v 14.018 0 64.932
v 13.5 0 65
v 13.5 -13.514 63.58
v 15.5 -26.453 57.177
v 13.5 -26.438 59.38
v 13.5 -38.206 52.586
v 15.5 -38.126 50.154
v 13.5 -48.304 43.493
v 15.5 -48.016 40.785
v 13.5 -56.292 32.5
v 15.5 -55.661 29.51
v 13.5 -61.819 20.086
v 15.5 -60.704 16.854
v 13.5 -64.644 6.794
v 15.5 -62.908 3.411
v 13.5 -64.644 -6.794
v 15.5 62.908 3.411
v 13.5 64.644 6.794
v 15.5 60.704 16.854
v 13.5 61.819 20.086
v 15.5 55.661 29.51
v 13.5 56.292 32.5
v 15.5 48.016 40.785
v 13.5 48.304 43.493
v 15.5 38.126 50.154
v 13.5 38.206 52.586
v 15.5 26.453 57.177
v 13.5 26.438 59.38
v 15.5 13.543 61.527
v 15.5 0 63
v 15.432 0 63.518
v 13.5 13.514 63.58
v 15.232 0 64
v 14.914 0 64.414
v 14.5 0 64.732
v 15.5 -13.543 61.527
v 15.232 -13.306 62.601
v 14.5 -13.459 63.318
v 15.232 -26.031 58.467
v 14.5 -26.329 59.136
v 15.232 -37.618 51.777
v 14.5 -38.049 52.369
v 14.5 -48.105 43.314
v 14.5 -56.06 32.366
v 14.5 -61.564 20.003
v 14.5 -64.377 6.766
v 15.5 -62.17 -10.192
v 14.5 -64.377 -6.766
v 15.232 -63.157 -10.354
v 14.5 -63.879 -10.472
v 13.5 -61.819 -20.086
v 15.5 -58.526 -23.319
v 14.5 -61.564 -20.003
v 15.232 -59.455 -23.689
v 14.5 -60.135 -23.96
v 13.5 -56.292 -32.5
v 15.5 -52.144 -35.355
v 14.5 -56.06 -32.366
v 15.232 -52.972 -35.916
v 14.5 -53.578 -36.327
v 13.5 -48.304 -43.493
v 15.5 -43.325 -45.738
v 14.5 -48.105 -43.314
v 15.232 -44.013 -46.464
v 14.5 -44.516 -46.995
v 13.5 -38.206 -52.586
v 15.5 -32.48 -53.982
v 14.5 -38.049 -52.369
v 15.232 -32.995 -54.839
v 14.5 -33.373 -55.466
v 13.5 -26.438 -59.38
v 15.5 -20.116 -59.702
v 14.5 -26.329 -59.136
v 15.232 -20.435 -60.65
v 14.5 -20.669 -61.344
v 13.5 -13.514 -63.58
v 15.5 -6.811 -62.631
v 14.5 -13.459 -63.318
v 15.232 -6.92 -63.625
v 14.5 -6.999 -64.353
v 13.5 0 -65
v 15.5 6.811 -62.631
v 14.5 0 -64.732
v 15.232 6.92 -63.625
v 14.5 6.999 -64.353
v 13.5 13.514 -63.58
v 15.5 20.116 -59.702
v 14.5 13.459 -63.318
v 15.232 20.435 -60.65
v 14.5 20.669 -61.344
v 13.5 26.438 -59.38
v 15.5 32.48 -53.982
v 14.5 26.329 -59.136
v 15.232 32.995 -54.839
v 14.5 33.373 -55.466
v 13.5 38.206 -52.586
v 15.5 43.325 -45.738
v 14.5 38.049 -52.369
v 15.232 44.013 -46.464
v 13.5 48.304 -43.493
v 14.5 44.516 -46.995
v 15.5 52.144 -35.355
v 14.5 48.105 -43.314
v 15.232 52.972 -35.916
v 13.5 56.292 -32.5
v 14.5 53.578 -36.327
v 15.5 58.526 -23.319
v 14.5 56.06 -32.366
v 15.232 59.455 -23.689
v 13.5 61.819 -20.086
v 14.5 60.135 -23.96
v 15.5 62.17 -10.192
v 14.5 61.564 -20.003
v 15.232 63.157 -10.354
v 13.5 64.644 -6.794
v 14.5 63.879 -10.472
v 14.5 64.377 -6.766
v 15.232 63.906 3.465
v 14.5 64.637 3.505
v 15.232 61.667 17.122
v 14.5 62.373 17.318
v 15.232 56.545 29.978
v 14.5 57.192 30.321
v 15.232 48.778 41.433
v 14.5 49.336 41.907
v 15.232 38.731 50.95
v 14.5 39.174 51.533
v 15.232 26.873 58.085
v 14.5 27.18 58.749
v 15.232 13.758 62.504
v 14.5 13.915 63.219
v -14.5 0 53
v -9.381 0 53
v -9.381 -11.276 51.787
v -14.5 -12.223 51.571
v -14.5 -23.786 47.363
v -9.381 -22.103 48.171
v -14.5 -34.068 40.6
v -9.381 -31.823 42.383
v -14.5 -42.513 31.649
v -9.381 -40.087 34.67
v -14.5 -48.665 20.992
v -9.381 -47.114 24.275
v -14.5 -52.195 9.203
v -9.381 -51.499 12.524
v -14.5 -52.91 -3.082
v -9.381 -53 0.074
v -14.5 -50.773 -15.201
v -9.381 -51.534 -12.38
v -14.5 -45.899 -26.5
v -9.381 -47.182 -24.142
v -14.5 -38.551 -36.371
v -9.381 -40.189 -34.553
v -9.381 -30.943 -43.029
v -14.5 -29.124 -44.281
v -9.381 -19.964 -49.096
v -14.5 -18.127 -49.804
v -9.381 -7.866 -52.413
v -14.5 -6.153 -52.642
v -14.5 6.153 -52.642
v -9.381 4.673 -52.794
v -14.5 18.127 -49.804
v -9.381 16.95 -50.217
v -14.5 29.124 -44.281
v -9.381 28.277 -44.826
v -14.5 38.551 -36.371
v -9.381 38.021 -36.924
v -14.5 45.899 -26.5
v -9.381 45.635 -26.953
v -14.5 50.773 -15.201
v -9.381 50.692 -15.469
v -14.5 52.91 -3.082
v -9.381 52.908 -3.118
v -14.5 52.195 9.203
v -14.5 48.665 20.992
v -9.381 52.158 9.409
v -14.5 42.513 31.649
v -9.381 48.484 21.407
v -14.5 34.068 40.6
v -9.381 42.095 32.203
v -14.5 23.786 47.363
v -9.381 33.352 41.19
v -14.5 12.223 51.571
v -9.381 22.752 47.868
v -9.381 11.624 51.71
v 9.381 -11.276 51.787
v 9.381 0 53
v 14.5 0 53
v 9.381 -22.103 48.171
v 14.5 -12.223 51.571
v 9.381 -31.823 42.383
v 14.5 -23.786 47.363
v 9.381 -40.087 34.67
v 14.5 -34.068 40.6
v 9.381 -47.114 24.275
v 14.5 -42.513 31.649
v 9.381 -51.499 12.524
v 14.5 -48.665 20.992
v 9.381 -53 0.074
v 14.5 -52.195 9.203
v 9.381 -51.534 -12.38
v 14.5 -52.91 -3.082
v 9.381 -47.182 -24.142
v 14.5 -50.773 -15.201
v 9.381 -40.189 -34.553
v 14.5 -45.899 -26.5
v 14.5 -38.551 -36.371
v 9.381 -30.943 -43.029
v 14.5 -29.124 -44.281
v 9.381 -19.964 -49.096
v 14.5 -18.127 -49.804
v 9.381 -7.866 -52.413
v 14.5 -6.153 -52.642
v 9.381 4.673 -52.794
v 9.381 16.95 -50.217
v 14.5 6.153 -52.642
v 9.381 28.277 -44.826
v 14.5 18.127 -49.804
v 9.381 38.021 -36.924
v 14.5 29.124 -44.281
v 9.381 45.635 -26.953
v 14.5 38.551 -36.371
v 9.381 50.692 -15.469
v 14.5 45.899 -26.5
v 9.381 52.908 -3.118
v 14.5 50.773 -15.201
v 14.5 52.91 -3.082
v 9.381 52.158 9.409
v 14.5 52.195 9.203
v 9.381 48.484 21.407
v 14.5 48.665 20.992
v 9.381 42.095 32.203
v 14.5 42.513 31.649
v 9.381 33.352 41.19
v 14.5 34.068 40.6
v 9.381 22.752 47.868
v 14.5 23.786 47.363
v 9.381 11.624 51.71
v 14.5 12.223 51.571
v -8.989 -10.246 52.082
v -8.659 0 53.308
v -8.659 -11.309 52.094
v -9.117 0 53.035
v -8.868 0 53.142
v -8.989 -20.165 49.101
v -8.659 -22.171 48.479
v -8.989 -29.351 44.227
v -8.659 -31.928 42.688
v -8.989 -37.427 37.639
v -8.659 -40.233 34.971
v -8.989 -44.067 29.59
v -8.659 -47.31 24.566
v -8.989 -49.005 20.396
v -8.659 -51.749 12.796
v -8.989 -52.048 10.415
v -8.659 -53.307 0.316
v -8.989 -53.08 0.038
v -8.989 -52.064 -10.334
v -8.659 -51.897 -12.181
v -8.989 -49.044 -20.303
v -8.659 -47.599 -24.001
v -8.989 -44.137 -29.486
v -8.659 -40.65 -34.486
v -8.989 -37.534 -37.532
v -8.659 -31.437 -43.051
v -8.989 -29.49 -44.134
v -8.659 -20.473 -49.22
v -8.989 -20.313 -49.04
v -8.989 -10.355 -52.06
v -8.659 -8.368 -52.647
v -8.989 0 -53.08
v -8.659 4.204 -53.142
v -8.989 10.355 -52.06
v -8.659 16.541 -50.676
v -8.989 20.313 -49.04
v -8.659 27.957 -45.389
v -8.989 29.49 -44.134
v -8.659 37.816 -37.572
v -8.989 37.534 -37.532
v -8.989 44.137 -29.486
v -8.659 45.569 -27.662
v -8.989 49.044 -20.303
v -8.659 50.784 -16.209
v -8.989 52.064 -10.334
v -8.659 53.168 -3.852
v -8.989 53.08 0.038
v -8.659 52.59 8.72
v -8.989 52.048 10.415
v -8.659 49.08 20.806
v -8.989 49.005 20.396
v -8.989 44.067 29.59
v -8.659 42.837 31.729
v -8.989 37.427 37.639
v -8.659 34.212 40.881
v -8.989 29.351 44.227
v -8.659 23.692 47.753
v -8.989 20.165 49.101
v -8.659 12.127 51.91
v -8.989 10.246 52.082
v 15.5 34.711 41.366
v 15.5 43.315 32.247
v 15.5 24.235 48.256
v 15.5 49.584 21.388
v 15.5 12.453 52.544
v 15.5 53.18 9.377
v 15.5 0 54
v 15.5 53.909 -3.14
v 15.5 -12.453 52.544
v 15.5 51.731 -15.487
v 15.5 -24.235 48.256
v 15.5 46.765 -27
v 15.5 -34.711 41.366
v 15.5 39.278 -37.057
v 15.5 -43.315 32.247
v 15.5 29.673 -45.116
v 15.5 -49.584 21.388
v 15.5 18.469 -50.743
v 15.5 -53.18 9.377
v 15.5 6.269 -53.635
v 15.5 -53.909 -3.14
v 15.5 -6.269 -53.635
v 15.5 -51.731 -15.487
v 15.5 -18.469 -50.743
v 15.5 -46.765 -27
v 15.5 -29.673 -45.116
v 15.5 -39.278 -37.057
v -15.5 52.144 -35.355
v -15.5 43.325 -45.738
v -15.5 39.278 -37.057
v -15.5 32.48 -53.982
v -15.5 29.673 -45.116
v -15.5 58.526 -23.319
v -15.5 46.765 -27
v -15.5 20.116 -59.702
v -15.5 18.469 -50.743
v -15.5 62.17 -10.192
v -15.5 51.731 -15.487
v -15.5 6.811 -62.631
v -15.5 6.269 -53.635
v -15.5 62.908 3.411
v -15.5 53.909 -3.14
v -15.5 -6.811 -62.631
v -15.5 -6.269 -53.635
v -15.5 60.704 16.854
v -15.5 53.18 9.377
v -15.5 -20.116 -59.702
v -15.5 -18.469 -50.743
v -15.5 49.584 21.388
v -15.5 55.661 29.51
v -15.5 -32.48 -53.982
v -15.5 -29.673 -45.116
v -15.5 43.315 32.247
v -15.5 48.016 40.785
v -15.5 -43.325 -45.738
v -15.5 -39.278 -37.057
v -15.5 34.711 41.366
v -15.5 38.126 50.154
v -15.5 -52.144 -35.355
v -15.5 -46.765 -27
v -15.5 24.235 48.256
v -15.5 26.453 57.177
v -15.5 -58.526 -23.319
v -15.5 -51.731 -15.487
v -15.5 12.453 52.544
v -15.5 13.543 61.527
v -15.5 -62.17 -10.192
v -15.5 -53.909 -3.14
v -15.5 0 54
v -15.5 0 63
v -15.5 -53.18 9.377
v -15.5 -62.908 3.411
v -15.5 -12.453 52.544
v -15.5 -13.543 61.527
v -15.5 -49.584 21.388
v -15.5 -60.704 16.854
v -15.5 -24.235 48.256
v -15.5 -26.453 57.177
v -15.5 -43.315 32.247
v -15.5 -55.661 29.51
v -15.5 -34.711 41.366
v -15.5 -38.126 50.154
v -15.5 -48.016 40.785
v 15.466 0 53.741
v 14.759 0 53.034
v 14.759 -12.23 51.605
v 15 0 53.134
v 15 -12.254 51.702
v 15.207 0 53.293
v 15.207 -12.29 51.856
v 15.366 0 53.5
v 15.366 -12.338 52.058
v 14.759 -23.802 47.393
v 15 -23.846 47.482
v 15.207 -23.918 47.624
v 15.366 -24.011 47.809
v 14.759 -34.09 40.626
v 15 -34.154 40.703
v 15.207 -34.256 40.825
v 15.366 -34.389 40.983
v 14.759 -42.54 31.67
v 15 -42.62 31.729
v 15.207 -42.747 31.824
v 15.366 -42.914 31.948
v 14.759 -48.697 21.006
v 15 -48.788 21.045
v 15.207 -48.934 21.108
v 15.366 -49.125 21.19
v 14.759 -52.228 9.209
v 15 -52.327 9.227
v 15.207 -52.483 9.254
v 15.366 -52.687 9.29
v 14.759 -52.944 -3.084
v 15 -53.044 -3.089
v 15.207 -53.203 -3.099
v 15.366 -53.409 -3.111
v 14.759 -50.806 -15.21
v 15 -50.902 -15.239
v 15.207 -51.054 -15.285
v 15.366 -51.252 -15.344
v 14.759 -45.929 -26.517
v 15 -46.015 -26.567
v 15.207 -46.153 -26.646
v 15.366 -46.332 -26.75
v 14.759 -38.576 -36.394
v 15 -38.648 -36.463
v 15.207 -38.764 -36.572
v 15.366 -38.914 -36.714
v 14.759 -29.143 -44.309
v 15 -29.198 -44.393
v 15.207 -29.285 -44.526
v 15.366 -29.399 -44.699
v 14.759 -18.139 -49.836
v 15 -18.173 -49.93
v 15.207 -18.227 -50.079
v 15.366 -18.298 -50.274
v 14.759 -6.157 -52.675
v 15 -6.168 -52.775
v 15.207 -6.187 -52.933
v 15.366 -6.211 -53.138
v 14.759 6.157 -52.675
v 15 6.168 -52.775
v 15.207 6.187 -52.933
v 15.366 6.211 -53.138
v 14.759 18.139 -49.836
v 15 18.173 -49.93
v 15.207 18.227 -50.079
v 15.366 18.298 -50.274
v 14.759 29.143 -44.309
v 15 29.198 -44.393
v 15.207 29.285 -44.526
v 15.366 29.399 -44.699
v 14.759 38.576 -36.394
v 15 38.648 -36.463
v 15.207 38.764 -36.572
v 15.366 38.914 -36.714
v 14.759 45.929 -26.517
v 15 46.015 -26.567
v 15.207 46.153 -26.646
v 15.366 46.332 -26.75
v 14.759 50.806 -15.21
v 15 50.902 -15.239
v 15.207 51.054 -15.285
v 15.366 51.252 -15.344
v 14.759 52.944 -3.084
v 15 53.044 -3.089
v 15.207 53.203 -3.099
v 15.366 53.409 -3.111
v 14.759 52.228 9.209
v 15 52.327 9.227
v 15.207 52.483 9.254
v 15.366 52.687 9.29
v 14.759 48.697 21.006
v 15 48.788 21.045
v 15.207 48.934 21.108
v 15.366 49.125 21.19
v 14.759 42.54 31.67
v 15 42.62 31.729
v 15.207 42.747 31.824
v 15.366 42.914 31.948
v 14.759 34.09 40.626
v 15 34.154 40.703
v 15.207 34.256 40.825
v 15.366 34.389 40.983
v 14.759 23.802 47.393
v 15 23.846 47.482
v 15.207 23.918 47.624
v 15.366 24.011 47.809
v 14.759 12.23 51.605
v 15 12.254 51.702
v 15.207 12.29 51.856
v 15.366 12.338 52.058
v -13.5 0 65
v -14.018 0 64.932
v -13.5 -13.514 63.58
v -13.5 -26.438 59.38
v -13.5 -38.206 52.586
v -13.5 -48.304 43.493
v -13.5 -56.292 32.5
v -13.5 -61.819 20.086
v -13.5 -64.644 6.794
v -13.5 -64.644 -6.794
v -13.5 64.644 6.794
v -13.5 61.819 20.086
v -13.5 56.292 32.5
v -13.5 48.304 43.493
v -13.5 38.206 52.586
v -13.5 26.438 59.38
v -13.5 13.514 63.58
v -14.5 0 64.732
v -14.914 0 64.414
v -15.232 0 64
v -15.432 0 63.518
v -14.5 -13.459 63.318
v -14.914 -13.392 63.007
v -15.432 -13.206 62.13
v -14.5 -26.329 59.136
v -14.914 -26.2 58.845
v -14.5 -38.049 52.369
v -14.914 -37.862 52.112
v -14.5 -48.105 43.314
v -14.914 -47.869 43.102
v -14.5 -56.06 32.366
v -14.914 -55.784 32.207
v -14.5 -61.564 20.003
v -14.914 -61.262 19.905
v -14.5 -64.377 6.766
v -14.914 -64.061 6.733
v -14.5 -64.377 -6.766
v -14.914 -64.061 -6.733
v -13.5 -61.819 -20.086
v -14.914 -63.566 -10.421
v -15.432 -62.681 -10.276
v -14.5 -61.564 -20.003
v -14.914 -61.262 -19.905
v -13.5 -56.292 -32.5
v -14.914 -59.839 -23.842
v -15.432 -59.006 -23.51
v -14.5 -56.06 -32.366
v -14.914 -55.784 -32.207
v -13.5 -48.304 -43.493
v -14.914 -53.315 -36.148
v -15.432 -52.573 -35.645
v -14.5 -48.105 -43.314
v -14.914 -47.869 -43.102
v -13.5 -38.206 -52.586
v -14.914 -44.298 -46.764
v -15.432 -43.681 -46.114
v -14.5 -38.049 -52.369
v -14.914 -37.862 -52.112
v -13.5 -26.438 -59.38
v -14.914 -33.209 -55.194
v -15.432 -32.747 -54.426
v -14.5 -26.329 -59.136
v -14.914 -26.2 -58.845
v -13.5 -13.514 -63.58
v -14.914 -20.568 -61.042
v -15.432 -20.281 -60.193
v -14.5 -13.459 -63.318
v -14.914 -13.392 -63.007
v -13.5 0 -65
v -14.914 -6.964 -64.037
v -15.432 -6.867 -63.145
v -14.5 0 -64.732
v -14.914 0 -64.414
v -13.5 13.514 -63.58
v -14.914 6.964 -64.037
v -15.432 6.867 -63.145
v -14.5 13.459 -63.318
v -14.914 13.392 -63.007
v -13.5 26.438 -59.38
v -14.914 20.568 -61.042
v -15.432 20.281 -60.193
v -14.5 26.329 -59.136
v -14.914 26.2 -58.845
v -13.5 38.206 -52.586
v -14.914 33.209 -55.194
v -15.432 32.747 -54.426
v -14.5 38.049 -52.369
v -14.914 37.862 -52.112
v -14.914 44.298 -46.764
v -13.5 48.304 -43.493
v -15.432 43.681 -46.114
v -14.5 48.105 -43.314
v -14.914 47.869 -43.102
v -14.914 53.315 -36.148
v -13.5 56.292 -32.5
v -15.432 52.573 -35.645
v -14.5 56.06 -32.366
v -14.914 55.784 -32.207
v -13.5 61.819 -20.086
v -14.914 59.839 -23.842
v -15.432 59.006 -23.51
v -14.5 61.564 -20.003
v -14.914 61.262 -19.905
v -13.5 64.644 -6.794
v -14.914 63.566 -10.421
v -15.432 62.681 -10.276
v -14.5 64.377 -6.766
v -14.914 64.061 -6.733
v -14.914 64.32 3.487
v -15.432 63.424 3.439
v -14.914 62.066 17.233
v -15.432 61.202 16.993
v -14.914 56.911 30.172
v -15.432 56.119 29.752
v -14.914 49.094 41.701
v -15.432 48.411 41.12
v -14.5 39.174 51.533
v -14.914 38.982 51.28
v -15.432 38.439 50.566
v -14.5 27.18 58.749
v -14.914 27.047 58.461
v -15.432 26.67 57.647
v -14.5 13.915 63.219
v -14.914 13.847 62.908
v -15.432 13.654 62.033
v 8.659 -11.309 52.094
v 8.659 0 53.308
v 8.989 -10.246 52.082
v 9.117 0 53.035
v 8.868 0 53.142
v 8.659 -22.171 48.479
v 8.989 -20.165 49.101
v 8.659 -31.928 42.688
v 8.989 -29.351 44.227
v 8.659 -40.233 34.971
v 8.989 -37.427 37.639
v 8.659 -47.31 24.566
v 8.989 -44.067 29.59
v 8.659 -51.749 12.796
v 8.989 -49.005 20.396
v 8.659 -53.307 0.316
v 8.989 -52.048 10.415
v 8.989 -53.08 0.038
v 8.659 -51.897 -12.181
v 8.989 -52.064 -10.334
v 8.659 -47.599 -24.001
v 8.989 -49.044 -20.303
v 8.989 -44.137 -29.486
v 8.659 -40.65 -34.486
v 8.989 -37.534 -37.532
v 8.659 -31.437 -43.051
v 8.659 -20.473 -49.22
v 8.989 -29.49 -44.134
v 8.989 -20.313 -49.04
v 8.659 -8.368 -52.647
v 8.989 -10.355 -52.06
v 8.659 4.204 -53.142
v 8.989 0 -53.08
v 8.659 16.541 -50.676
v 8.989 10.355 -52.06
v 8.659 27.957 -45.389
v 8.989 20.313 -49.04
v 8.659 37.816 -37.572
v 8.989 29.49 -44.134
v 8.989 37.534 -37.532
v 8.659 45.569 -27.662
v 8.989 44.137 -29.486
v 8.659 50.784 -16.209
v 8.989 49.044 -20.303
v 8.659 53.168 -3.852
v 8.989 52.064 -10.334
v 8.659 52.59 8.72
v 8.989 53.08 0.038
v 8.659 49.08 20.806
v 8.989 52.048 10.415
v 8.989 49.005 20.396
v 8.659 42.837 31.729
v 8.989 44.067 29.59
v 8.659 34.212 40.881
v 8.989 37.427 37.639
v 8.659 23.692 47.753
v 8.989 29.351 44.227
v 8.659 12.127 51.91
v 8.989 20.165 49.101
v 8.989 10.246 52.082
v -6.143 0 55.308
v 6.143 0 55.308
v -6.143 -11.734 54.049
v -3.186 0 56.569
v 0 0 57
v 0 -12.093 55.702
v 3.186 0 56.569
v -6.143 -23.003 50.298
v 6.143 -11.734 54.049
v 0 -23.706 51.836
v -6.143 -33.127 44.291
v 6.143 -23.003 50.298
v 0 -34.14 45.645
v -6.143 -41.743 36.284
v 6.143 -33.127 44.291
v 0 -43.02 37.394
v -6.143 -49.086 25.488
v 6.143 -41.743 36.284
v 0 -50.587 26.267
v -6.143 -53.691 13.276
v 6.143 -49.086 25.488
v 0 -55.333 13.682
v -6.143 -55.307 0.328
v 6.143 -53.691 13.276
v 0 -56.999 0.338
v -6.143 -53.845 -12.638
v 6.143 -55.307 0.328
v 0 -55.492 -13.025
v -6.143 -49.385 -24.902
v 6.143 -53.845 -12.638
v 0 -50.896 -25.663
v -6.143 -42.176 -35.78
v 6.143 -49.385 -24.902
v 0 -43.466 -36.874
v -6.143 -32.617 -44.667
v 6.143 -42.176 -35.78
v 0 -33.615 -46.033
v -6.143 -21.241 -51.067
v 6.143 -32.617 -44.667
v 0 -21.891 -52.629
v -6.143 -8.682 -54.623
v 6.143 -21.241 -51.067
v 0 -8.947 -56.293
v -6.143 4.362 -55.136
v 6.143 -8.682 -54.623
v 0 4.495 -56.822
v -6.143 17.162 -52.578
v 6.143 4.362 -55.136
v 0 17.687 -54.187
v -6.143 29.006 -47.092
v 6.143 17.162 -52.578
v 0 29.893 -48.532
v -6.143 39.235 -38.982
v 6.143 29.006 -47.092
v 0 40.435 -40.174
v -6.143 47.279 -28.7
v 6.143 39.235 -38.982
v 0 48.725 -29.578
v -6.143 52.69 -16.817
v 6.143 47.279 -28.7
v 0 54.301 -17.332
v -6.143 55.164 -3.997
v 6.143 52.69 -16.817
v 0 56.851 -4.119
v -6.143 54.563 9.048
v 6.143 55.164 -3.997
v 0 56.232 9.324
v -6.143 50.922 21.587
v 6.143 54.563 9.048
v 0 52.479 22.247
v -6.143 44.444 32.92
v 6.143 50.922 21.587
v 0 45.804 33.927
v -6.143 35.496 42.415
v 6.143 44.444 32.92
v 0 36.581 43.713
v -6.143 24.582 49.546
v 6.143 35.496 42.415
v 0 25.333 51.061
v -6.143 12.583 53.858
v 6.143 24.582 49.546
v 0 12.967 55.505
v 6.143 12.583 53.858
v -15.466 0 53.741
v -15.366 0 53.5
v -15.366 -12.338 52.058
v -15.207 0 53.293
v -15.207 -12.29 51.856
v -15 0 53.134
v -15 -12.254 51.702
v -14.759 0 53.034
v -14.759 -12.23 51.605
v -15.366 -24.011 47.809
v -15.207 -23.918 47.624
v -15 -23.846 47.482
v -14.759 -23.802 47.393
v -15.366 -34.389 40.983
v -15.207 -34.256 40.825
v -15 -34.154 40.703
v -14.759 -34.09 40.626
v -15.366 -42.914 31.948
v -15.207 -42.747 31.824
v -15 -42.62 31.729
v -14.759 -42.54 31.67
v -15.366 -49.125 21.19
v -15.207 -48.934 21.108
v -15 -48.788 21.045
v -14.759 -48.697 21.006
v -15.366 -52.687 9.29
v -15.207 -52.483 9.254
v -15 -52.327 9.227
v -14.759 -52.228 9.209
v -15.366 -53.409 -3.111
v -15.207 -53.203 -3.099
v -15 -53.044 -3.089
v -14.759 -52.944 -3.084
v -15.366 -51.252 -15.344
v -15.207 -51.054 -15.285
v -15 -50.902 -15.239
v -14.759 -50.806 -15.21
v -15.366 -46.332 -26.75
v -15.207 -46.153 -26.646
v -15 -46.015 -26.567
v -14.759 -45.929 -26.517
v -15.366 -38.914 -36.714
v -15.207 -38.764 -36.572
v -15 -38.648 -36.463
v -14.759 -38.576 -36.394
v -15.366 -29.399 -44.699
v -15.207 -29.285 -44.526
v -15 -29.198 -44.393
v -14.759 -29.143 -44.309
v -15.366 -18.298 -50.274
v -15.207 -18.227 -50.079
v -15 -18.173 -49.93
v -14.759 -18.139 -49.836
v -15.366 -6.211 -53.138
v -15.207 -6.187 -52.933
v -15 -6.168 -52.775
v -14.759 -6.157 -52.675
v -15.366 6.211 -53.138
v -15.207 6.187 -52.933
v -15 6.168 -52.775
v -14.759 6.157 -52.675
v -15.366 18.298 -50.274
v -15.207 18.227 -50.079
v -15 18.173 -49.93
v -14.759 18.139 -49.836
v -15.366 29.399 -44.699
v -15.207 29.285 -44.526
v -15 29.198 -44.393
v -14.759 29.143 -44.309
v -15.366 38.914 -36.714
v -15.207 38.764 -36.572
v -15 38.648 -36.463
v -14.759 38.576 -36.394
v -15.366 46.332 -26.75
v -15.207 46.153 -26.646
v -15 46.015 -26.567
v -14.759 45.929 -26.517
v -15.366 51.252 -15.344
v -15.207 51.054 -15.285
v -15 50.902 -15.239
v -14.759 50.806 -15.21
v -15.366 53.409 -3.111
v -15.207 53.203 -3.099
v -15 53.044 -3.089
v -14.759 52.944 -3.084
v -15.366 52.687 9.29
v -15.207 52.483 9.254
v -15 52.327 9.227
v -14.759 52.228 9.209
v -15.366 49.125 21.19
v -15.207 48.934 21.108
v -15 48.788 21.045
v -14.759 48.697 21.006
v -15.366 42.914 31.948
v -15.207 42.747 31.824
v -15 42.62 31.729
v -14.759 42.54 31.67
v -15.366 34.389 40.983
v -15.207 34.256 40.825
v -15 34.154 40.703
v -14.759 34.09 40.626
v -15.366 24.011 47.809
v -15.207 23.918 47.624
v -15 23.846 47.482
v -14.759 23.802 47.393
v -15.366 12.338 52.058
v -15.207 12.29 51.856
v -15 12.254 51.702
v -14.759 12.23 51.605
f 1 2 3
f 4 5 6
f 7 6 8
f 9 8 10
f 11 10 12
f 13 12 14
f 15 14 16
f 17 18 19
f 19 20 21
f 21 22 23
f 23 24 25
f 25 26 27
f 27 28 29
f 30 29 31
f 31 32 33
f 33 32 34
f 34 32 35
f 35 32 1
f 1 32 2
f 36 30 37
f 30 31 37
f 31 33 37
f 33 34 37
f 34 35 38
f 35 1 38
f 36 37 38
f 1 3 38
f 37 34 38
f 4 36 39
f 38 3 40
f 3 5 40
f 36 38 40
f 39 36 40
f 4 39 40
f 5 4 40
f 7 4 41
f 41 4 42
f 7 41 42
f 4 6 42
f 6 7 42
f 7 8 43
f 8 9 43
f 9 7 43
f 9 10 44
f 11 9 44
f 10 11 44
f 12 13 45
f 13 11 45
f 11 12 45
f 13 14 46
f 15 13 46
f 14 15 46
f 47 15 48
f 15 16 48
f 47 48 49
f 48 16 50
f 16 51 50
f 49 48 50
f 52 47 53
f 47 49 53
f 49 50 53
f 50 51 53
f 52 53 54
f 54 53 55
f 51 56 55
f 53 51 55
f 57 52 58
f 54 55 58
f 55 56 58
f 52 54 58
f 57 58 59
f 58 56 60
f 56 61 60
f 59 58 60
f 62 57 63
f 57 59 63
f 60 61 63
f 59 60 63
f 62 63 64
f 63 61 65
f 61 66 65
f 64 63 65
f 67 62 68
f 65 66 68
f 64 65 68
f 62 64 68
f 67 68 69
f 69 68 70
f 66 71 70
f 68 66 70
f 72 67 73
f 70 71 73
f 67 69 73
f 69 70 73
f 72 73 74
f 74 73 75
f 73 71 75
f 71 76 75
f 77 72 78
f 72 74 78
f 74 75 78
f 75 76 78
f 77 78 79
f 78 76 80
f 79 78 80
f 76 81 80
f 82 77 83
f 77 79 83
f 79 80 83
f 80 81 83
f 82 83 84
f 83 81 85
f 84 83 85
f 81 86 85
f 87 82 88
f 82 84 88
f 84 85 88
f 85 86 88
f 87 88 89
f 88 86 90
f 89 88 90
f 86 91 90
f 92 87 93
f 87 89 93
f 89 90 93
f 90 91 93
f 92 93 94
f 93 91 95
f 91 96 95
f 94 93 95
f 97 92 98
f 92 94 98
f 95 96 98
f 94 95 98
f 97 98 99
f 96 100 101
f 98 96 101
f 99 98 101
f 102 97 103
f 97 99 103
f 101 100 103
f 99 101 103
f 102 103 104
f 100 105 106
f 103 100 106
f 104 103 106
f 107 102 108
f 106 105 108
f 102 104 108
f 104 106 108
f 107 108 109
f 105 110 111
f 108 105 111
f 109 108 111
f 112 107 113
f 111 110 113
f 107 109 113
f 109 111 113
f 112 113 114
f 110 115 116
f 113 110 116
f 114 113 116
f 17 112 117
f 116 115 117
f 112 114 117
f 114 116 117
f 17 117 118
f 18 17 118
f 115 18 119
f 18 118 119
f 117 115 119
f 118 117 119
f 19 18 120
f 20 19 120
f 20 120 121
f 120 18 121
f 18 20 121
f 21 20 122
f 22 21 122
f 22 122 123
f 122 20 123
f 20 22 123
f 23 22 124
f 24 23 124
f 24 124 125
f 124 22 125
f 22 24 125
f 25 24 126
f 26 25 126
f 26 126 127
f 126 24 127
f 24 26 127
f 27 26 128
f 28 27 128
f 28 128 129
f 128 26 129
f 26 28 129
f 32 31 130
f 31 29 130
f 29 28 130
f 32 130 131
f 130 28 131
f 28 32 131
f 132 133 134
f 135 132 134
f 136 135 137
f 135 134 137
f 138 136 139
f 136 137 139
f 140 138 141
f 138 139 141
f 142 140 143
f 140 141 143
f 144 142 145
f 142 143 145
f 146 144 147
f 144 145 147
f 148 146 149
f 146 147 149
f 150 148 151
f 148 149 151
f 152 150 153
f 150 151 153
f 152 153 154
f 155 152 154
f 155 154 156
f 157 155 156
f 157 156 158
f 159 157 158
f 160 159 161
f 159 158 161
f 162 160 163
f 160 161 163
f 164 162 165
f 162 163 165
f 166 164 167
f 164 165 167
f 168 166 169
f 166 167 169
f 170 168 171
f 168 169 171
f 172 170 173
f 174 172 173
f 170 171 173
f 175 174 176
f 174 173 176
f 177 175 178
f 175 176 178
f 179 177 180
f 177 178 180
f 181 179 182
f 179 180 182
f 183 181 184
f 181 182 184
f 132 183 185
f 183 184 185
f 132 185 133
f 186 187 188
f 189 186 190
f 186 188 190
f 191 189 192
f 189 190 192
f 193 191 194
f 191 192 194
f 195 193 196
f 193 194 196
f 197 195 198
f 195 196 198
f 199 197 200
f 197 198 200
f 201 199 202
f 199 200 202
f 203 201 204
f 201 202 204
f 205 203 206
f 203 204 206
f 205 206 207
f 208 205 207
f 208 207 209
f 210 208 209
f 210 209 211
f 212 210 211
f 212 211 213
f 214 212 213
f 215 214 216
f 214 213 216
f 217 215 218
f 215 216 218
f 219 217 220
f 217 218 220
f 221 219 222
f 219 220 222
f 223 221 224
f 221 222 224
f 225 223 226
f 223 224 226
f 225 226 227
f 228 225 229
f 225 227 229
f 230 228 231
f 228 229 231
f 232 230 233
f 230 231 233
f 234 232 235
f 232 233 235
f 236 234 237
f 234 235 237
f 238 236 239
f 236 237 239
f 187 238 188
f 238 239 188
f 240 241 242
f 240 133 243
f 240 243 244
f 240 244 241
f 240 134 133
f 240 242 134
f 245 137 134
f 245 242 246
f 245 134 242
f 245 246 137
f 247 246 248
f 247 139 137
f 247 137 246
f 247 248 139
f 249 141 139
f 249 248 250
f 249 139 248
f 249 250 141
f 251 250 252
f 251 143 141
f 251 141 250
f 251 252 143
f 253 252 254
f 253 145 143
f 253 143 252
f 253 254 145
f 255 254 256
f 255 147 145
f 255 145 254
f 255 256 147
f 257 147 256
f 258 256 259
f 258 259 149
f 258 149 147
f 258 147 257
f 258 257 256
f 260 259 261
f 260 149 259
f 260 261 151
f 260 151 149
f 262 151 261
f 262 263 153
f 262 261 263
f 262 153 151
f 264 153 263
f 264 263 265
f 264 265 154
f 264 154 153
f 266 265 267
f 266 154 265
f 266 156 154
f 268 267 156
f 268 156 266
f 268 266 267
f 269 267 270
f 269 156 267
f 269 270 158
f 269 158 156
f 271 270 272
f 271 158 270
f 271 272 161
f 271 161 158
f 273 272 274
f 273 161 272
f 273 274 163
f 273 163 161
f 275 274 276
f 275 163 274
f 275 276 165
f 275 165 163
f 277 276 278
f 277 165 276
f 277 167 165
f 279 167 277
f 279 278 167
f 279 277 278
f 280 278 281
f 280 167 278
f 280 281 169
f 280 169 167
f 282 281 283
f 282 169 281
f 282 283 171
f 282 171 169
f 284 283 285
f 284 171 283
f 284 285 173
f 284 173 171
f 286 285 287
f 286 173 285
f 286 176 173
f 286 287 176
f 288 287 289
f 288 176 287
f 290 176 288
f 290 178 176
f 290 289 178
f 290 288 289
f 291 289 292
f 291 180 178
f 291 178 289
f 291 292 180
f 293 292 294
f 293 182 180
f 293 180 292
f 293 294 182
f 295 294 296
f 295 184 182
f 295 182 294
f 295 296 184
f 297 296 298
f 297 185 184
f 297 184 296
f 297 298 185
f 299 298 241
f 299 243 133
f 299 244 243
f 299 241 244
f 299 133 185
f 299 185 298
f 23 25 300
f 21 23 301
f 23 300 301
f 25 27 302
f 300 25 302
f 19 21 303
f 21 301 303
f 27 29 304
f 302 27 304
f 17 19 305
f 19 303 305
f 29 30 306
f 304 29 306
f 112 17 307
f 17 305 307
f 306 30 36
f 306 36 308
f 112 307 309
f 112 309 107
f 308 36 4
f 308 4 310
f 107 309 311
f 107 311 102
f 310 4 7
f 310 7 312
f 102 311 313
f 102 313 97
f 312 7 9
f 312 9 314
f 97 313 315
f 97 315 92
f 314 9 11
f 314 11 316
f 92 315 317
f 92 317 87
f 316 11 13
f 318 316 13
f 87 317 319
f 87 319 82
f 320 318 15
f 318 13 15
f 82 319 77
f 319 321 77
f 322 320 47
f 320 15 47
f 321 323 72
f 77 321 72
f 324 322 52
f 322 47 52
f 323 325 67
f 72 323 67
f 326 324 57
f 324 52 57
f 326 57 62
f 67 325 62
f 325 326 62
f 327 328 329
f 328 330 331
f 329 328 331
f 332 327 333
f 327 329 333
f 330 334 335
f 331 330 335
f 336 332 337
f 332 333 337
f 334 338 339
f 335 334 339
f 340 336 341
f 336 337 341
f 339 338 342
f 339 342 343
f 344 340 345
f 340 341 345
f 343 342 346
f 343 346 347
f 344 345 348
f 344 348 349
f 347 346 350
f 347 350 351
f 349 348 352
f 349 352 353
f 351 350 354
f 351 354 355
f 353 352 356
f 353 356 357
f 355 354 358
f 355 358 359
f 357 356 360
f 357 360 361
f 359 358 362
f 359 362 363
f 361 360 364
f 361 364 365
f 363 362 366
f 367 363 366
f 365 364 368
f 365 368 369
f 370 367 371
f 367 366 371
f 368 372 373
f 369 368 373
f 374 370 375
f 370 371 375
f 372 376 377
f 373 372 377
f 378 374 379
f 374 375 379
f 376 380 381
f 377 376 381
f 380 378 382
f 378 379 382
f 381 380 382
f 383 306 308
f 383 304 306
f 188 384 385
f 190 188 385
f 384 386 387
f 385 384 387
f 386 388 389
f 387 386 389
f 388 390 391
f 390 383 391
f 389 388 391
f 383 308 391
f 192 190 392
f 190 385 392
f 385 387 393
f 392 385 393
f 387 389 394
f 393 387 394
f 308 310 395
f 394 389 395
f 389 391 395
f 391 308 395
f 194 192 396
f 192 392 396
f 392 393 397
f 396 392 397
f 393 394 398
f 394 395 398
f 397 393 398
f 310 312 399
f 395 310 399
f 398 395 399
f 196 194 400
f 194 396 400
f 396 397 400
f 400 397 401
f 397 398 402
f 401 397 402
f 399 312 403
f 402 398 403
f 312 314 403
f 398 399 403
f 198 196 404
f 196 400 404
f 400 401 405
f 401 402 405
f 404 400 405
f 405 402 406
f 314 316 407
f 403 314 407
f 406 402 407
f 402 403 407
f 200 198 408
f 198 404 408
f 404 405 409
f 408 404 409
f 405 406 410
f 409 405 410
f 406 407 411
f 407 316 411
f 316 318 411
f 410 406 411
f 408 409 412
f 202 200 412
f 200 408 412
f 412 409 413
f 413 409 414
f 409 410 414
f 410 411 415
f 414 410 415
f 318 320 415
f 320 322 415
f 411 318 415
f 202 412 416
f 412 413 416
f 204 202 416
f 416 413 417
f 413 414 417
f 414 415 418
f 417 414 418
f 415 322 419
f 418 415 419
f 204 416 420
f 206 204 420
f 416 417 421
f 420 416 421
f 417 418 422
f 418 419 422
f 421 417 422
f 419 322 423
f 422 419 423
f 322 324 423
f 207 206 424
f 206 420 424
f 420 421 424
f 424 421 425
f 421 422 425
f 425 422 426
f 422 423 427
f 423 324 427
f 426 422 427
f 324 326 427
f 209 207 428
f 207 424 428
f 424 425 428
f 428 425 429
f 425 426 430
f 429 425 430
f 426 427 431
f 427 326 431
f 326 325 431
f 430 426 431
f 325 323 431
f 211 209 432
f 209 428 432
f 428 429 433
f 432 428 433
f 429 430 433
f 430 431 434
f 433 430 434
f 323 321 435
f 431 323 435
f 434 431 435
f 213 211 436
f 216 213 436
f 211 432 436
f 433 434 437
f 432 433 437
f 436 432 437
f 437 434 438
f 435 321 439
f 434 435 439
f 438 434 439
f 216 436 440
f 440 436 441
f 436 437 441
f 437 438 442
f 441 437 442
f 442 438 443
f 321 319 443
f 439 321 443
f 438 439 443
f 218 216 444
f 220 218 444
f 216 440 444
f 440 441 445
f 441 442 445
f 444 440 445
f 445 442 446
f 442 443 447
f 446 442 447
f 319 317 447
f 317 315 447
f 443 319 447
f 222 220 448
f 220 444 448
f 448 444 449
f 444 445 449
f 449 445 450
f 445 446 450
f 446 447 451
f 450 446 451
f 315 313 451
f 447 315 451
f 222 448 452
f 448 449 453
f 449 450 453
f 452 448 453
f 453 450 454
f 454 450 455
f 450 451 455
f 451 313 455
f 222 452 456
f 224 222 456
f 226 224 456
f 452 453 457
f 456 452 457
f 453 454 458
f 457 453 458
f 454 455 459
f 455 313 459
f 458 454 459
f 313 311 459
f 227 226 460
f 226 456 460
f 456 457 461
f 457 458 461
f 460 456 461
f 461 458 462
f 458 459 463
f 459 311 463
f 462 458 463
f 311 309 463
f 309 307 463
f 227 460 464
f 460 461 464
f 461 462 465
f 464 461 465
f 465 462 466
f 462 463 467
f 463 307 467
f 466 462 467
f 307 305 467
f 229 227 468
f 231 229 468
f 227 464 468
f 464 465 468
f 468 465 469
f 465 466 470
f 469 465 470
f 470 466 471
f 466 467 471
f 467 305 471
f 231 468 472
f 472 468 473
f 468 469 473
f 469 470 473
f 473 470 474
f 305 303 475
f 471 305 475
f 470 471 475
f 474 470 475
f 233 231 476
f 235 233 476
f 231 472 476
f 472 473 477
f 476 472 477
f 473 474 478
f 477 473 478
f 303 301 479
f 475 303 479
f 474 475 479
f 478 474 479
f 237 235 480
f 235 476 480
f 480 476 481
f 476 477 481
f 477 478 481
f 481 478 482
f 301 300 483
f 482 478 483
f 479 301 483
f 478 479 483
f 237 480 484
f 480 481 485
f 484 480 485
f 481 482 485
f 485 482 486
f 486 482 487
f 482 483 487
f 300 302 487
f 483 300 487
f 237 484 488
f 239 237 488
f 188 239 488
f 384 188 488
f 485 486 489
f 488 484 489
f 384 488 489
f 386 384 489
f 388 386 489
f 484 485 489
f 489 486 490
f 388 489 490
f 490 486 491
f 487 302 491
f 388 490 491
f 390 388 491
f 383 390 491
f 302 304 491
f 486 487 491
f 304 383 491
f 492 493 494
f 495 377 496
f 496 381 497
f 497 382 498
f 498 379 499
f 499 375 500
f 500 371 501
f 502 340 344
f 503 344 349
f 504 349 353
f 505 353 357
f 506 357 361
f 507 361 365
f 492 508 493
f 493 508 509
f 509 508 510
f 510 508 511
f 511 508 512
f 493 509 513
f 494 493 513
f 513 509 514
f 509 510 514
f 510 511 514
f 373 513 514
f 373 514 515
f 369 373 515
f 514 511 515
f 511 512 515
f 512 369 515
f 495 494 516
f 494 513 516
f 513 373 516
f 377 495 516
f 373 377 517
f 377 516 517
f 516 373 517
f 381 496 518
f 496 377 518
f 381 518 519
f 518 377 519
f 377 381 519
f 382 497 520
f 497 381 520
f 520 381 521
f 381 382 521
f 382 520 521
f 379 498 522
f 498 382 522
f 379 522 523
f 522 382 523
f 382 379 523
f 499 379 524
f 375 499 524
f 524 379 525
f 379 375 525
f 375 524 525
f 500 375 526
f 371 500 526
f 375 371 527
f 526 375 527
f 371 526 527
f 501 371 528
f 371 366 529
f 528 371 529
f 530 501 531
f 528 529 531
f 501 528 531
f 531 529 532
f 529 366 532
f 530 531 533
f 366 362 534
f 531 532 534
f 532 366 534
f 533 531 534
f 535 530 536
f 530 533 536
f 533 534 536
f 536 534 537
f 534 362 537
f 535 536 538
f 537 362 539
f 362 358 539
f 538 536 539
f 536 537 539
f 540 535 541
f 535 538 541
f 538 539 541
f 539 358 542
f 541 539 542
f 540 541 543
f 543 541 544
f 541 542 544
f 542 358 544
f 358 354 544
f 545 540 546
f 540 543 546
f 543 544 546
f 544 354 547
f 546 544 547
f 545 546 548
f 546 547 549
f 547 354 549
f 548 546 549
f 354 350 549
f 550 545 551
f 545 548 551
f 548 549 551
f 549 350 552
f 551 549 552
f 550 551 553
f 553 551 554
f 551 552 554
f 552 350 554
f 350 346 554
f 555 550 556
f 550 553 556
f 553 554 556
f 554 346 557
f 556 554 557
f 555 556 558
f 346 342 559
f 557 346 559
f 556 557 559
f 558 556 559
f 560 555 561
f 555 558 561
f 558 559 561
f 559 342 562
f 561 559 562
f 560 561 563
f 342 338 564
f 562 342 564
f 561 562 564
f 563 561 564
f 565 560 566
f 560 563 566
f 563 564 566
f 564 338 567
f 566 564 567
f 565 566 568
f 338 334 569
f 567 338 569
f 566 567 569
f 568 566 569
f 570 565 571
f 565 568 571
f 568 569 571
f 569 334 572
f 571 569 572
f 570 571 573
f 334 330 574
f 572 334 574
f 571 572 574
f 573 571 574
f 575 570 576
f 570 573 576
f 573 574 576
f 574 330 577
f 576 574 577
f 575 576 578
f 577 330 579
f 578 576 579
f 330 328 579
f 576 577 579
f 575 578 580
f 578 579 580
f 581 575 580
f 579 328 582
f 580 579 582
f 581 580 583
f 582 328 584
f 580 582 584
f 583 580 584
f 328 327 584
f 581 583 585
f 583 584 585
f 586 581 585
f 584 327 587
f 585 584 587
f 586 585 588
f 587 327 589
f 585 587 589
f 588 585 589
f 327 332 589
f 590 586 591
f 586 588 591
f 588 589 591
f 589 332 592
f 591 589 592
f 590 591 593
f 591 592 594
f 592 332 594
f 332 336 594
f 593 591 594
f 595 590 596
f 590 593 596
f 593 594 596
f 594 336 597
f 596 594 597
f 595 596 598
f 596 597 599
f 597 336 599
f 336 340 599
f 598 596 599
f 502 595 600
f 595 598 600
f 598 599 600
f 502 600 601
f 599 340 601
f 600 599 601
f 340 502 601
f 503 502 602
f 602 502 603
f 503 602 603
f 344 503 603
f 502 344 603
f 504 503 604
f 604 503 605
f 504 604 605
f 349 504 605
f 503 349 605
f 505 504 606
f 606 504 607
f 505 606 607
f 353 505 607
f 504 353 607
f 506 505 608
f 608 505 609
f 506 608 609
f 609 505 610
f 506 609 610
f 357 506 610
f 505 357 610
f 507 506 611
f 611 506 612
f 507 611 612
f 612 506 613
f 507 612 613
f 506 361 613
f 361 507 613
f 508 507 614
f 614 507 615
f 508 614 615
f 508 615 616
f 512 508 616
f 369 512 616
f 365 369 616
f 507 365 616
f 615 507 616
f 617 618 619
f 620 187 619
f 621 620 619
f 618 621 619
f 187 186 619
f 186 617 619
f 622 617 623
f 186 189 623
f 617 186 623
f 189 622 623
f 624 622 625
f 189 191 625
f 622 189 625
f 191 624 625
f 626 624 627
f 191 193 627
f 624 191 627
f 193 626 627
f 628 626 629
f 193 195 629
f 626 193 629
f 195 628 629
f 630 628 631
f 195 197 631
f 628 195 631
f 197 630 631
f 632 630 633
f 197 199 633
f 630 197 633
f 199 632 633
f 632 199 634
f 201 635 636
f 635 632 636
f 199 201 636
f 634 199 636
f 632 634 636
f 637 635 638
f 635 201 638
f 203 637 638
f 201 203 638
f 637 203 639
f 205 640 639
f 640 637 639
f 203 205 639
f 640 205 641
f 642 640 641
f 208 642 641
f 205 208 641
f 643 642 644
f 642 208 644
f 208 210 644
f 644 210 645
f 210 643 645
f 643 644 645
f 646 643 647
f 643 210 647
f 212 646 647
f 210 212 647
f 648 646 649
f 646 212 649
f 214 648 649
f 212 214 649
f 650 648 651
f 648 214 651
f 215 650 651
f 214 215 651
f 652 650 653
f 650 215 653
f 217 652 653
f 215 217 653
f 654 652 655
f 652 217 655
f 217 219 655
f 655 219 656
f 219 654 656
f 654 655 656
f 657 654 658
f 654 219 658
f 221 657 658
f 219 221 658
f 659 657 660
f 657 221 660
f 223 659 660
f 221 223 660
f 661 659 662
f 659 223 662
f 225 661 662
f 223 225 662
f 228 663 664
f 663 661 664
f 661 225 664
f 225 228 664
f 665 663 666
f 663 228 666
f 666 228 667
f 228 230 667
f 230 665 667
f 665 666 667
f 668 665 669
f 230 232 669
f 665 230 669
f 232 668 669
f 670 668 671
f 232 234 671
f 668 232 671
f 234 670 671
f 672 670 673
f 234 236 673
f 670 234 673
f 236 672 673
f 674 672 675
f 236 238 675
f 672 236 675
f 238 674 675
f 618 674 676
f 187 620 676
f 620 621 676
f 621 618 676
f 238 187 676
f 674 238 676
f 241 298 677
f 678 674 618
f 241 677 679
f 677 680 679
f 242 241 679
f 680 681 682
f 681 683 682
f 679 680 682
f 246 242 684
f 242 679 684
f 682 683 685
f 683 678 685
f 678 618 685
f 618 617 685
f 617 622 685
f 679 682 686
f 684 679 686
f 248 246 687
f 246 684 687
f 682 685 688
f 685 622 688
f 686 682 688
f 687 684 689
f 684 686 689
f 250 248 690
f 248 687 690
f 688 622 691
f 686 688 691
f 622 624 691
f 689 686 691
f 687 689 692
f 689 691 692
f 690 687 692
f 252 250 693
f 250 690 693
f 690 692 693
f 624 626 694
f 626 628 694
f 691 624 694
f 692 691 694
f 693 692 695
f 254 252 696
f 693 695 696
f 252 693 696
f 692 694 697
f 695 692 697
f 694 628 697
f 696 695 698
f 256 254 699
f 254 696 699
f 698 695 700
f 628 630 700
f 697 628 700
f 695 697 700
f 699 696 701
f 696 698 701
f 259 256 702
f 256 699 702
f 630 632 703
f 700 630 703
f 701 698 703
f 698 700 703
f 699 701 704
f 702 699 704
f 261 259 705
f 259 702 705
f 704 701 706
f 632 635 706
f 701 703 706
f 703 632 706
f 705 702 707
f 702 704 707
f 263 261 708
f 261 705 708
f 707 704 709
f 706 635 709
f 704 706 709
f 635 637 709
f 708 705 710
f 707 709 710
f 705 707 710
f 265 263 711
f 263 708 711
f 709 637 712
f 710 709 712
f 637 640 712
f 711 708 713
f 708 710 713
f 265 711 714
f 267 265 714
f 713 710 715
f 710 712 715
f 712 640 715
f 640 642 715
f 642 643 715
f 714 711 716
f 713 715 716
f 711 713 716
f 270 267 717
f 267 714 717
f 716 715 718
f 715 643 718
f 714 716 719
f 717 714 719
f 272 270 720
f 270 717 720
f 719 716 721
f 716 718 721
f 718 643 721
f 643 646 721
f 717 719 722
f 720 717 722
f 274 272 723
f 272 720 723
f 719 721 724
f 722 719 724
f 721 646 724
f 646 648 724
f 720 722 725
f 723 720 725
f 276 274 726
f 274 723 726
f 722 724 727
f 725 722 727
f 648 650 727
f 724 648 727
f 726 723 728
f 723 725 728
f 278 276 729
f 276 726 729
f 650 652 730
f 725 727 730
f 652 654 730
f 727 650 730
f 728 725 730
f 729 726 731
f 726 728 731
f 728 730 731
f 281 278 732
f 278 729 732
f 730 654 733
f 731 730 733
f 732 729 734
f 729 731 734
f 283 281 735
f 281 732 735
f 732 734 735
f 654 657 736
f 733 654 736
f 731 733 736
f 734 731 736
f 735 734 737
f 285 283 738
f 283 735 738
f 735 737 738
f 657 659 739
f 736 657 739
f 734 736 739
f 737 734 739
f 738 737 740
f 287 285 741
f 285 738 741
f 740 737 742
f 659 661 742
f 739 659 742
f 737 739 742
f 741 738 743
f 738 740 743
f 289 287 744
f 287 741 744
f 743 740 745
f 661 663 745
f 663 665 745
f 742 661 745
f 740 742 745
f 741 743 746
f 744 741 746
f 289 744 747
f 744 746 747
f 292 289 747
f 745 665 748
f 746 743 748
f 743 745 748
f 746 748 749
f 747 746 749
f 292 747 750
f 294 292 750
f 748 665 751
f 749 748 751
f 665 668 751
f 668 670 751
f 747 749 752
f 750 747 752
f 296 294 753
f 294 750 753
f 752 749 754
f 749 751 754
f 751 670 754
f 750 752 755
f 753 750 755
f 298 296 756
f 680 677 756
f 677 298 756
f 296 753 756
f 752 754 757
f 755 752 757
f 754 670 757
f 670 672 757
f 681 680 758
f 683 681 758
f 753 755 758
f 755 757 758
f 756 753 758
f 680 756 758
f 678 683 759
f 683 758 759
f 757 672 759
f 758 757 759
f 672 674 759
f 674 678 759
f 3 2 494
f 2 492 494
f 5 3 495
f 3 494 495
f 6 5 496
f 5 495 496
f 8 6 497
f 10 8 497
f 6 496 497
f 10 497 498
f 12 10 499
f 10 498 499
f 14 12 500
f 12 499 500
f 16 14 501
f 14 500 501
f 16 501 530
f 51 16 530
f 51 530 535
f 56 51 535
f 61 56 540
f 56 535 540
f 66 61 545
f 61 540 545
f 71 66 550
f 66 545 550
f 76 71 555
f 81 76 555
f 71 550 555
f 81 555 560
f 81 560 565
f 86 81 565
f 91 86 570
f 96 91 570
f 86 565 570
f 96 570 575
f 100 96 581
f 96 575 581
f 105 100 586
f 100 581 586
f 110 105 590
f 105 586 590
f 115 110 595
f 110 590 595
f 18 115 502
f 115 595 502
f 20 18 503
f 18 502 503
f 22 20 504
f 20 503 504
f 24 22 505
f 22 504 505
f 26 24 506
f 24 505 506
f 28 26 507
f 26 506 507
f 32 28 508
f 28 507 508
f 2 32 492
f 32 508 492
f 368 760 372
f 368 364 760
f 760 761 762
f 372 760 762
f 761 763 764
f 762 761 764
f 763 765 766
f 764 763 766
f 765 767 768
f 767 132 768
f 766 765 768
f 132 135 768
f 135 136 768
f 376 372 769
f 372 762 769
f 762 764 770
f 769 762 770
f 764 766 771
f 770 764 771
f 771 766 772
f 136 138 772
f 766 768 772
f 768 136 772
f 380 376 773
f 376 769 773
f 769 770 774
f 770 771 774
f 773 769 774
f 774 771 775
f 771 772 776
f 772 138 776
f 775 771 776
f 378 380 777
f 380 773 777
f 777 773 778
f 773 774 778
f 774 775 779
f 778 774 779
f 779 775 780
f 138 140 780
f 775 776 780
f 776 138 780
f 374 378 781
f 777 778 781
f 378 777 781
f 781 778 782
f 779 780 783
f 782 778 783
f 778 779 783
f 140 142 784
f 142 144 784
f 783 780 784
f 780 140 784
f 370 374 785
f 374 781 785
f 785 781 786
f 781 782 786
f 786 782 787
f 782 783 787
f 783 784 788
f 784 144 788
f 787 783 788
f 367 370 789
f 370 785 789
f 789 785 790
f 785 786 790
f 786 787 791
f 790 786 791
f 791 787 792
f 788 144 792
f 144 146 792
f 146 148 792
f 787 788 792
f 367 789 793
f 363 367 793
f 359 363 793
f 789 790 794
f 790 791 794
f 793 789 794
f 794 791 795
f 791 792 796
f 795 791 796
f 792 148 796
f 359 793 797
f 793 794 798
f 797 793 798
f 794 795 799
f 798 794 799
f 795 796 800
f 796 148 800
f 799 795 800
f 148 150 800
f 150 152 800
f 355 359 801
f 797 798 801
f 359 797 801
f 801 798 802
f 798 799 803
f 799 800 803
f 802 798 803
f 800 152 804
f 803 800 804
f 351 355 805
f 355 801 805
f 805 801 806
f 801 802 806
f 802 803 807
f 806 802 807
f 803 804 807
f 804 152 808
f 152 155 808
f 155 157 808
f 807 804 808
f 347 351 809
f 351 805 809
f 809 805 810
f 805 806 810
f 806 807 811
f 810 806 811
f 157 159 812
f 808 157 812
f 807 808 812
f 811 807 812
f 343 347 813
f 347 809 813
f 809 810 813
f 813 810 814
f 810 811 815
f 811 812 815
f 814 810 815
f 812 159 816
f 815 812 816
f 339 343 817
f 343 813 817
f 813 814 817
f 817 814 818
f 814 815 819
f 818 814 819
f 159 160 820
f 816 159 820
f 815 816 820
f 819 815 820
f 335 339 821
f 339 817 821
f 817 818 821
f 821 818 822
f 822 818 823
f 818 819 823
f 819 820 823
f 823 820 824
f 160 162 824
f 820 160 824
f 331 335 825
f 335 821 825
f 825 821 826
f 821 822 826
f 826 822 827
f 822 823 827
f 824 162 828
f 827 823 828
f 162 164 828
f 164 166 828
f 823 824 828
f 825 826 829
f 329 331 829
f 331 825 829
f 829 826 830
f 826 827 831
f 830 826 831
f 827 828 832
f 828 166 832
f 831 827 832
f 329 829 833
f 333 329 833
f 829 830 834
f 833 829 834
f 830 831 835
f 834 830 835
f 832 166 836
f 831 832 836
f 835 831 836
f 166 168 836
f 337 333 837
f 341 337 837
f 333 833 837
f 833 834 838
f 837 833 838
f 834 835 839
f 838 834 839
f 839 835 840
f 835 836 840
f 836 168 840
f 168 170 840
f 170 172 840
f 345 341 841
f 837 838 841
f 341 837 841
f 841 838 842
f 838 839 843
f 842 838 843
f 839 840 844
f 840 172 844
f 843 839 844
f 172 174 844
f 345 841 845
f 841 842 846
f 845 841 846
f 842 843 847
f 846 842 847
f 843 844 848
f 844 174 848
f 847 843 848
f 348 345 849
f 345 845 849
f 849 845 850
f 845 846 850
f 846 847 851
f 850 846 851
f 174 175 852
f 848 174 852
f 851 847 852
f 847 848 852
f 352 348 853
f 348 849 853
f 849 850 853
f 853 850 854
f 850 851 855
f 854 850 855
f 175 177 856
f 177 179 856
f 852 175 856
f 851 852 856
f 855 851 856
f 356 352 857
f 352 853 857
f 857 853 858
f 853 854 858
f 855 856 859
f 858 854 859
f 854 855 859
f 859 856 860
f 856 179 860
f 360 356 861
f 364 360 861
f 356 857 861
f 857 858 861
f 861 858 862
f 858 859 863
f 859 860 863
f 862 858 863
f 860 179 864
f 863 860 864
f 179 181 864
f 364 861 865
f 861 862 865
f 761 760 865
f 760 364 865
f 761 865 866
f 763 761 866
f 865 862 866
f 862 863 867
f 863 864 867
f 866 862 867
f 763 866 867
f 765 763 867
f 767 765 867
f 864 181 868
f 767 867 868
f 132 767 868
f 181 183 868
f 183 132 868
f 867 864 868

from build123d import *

# Parameters (mm, degrees)
FILLET1_R = 1


with BuildPart() as part:
    # Sketch1 → Revolve1 (revolve)
    with BuildSketch(Plane.XY, mode=Mode.PRIVATE) as revolve1_sk:
        with BuildLine():
            Line((8.94427191, 53), (15.5, 53))
            Line((15.5, 53), (15.5, 63))
            ThreePointArc((15.5, 63), (14.914213562, 64.414213562), (13.5, 65))
            Line((13.5, 65), (-13.5, 65))
            ThreePointArc((-13.5, 65), (-14.914213562, 64.414213562), (-15.5, 63))
            Line((-15.5, 63), (-15.5, 53))
            Line((-15.5, 53), (-8.94427191, 53))
            ThreePointArc((-8.94427191, 53), (0, 57), (8.94427191, 53))
        make_face()
    revolve(revolve1_sk.sketch.rotate(Axis((0, 0, 0), (1, 0, 0)), 90), axis=Axis((0, 0, 0), (1, 0, 0)))

    # Fillet1
    fillet1_edges = [part.edges().sort_by_distance(p)[0] for p in [
        (15.5, 0, -53),
        (8.94427191, 0, -53),
        (-8.94427191, 0, -53),
        (-15.5, 0, -53),
    ]]
    fillet(fillet1_edges, radius=FILLET1_R)


solid = part.part
